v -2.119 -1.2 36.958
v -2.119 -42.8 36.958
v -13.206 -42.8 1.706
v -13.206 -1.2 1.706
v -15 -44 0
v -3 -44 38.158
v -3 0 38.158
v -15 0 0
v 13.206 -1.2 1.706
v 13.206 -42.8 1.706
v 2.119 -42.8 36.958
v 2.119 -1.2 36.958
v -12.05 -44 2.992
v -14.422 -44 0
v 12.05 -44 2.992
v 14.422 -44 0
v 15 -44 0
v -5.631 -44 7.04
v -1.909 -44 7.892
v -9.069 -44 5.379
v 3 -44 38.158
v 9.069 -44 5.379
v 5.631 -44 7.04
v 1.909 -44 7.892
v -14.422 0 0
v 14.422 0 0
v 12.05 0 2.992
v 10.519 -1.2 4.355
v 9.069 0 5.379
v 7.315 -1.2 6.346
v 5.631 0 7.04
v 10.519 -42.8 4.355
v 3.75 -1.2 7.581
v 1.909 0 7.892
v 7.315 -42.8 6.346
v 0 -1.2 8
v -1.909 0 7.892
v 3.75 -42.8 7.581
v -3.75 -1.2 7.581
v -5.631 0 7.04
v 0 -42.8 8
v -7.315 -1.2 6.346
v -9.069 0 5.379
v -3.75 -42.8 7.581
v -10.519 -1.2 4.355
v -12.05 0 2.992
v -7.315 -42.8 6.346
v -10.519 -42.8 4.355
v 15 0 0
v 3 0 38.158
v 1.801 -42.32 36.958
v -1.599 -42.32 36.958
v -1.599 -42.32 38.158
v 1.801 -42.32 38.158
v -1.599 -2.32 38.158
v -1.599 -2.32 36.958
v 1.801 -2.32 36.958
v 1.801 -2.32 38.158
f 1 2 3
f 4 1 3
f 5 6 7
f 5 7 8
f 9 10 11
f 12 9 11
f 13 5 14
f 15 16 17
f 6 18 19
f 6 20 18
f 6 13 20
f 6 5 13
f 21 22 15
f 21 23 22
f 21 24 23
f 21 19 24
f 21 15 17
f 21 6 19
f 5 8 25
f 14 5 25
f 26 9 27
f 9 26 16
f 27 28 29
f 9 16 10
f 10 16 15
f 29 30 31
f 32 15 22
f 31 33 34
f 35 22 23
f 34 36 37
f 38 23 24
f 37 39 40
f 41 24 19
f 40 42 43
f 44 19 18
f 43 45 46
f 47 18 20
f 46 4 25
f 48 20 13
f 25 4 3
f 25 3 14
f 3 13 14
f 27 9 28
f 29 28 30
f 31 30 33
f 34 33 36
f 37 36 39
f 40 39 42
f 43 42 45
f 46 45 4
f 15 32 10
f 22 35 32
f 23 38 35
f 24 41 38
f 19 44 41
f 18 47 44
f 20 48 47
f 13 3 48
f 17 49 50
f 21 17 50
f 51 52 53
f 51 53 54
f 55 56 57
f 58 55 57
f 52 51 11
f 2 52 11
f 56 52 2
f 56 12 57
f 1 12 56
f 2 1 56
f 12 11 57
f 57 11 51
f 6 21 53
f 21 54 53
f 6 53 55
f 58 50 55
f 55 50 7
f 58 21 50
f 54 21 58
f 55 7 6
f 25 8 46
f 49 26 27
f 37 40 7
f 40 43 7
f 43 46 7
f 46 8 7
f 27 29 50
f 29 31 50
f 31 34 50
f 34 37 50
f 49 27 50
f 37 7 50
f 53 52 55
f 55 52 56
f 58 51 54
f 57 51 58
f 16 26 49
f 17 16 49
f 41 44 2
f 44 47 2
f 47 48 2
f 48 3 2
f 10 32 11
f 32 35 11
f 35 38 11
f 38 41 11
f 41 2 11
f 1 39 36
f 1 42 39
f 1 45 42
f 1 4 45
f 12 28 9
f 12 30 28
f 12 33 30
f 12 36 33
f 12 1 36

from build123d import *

# Parameters (mm, degrees)
F1_DEPTH = 44
F4_T     = -1.2
F3_R     = 17
F5_DEPTH = 25
F6_W     = 3.4
F6_H     = 40
F7_DEPTH = 50


with BuildPart() as f1:
    # F0 (on Front) → F1 (new body)
    with BuildSketch(Plane.XZ):
        Polygon((-3, 38.157568), (-15, 0), (15, 0), (3, 38.157568), align=None)
    extrude(amount=F1_DEPTH)

    # F4
    f4_openings = [f1.faces().sort_by_distance(p)[0] for p in [
        (0, -22, 0),
    ]]
    offset(amount=F4_T, openings=f4_openings)

    # F3 (on offset) → F5 (cut, symmetric)
    with BuildSketch(Plane.XZ.offset(25)):
        with Locations((0, -9)):
            Circle(F3_R)
    extrude(amount=F5_DEPTH, both=True, mode=Mode.SUBTRACT)

    # F6 (on Top) → F7 (cut)
    with BuildSketch(Plane.XY):
        with Locations((0.101443, -22.319711)):
            Rectangle(F6_W, F6_H)
    extrude(amount=F7_DEPTH, mode=Mode.SUBTRACT)


solid = f1.part
